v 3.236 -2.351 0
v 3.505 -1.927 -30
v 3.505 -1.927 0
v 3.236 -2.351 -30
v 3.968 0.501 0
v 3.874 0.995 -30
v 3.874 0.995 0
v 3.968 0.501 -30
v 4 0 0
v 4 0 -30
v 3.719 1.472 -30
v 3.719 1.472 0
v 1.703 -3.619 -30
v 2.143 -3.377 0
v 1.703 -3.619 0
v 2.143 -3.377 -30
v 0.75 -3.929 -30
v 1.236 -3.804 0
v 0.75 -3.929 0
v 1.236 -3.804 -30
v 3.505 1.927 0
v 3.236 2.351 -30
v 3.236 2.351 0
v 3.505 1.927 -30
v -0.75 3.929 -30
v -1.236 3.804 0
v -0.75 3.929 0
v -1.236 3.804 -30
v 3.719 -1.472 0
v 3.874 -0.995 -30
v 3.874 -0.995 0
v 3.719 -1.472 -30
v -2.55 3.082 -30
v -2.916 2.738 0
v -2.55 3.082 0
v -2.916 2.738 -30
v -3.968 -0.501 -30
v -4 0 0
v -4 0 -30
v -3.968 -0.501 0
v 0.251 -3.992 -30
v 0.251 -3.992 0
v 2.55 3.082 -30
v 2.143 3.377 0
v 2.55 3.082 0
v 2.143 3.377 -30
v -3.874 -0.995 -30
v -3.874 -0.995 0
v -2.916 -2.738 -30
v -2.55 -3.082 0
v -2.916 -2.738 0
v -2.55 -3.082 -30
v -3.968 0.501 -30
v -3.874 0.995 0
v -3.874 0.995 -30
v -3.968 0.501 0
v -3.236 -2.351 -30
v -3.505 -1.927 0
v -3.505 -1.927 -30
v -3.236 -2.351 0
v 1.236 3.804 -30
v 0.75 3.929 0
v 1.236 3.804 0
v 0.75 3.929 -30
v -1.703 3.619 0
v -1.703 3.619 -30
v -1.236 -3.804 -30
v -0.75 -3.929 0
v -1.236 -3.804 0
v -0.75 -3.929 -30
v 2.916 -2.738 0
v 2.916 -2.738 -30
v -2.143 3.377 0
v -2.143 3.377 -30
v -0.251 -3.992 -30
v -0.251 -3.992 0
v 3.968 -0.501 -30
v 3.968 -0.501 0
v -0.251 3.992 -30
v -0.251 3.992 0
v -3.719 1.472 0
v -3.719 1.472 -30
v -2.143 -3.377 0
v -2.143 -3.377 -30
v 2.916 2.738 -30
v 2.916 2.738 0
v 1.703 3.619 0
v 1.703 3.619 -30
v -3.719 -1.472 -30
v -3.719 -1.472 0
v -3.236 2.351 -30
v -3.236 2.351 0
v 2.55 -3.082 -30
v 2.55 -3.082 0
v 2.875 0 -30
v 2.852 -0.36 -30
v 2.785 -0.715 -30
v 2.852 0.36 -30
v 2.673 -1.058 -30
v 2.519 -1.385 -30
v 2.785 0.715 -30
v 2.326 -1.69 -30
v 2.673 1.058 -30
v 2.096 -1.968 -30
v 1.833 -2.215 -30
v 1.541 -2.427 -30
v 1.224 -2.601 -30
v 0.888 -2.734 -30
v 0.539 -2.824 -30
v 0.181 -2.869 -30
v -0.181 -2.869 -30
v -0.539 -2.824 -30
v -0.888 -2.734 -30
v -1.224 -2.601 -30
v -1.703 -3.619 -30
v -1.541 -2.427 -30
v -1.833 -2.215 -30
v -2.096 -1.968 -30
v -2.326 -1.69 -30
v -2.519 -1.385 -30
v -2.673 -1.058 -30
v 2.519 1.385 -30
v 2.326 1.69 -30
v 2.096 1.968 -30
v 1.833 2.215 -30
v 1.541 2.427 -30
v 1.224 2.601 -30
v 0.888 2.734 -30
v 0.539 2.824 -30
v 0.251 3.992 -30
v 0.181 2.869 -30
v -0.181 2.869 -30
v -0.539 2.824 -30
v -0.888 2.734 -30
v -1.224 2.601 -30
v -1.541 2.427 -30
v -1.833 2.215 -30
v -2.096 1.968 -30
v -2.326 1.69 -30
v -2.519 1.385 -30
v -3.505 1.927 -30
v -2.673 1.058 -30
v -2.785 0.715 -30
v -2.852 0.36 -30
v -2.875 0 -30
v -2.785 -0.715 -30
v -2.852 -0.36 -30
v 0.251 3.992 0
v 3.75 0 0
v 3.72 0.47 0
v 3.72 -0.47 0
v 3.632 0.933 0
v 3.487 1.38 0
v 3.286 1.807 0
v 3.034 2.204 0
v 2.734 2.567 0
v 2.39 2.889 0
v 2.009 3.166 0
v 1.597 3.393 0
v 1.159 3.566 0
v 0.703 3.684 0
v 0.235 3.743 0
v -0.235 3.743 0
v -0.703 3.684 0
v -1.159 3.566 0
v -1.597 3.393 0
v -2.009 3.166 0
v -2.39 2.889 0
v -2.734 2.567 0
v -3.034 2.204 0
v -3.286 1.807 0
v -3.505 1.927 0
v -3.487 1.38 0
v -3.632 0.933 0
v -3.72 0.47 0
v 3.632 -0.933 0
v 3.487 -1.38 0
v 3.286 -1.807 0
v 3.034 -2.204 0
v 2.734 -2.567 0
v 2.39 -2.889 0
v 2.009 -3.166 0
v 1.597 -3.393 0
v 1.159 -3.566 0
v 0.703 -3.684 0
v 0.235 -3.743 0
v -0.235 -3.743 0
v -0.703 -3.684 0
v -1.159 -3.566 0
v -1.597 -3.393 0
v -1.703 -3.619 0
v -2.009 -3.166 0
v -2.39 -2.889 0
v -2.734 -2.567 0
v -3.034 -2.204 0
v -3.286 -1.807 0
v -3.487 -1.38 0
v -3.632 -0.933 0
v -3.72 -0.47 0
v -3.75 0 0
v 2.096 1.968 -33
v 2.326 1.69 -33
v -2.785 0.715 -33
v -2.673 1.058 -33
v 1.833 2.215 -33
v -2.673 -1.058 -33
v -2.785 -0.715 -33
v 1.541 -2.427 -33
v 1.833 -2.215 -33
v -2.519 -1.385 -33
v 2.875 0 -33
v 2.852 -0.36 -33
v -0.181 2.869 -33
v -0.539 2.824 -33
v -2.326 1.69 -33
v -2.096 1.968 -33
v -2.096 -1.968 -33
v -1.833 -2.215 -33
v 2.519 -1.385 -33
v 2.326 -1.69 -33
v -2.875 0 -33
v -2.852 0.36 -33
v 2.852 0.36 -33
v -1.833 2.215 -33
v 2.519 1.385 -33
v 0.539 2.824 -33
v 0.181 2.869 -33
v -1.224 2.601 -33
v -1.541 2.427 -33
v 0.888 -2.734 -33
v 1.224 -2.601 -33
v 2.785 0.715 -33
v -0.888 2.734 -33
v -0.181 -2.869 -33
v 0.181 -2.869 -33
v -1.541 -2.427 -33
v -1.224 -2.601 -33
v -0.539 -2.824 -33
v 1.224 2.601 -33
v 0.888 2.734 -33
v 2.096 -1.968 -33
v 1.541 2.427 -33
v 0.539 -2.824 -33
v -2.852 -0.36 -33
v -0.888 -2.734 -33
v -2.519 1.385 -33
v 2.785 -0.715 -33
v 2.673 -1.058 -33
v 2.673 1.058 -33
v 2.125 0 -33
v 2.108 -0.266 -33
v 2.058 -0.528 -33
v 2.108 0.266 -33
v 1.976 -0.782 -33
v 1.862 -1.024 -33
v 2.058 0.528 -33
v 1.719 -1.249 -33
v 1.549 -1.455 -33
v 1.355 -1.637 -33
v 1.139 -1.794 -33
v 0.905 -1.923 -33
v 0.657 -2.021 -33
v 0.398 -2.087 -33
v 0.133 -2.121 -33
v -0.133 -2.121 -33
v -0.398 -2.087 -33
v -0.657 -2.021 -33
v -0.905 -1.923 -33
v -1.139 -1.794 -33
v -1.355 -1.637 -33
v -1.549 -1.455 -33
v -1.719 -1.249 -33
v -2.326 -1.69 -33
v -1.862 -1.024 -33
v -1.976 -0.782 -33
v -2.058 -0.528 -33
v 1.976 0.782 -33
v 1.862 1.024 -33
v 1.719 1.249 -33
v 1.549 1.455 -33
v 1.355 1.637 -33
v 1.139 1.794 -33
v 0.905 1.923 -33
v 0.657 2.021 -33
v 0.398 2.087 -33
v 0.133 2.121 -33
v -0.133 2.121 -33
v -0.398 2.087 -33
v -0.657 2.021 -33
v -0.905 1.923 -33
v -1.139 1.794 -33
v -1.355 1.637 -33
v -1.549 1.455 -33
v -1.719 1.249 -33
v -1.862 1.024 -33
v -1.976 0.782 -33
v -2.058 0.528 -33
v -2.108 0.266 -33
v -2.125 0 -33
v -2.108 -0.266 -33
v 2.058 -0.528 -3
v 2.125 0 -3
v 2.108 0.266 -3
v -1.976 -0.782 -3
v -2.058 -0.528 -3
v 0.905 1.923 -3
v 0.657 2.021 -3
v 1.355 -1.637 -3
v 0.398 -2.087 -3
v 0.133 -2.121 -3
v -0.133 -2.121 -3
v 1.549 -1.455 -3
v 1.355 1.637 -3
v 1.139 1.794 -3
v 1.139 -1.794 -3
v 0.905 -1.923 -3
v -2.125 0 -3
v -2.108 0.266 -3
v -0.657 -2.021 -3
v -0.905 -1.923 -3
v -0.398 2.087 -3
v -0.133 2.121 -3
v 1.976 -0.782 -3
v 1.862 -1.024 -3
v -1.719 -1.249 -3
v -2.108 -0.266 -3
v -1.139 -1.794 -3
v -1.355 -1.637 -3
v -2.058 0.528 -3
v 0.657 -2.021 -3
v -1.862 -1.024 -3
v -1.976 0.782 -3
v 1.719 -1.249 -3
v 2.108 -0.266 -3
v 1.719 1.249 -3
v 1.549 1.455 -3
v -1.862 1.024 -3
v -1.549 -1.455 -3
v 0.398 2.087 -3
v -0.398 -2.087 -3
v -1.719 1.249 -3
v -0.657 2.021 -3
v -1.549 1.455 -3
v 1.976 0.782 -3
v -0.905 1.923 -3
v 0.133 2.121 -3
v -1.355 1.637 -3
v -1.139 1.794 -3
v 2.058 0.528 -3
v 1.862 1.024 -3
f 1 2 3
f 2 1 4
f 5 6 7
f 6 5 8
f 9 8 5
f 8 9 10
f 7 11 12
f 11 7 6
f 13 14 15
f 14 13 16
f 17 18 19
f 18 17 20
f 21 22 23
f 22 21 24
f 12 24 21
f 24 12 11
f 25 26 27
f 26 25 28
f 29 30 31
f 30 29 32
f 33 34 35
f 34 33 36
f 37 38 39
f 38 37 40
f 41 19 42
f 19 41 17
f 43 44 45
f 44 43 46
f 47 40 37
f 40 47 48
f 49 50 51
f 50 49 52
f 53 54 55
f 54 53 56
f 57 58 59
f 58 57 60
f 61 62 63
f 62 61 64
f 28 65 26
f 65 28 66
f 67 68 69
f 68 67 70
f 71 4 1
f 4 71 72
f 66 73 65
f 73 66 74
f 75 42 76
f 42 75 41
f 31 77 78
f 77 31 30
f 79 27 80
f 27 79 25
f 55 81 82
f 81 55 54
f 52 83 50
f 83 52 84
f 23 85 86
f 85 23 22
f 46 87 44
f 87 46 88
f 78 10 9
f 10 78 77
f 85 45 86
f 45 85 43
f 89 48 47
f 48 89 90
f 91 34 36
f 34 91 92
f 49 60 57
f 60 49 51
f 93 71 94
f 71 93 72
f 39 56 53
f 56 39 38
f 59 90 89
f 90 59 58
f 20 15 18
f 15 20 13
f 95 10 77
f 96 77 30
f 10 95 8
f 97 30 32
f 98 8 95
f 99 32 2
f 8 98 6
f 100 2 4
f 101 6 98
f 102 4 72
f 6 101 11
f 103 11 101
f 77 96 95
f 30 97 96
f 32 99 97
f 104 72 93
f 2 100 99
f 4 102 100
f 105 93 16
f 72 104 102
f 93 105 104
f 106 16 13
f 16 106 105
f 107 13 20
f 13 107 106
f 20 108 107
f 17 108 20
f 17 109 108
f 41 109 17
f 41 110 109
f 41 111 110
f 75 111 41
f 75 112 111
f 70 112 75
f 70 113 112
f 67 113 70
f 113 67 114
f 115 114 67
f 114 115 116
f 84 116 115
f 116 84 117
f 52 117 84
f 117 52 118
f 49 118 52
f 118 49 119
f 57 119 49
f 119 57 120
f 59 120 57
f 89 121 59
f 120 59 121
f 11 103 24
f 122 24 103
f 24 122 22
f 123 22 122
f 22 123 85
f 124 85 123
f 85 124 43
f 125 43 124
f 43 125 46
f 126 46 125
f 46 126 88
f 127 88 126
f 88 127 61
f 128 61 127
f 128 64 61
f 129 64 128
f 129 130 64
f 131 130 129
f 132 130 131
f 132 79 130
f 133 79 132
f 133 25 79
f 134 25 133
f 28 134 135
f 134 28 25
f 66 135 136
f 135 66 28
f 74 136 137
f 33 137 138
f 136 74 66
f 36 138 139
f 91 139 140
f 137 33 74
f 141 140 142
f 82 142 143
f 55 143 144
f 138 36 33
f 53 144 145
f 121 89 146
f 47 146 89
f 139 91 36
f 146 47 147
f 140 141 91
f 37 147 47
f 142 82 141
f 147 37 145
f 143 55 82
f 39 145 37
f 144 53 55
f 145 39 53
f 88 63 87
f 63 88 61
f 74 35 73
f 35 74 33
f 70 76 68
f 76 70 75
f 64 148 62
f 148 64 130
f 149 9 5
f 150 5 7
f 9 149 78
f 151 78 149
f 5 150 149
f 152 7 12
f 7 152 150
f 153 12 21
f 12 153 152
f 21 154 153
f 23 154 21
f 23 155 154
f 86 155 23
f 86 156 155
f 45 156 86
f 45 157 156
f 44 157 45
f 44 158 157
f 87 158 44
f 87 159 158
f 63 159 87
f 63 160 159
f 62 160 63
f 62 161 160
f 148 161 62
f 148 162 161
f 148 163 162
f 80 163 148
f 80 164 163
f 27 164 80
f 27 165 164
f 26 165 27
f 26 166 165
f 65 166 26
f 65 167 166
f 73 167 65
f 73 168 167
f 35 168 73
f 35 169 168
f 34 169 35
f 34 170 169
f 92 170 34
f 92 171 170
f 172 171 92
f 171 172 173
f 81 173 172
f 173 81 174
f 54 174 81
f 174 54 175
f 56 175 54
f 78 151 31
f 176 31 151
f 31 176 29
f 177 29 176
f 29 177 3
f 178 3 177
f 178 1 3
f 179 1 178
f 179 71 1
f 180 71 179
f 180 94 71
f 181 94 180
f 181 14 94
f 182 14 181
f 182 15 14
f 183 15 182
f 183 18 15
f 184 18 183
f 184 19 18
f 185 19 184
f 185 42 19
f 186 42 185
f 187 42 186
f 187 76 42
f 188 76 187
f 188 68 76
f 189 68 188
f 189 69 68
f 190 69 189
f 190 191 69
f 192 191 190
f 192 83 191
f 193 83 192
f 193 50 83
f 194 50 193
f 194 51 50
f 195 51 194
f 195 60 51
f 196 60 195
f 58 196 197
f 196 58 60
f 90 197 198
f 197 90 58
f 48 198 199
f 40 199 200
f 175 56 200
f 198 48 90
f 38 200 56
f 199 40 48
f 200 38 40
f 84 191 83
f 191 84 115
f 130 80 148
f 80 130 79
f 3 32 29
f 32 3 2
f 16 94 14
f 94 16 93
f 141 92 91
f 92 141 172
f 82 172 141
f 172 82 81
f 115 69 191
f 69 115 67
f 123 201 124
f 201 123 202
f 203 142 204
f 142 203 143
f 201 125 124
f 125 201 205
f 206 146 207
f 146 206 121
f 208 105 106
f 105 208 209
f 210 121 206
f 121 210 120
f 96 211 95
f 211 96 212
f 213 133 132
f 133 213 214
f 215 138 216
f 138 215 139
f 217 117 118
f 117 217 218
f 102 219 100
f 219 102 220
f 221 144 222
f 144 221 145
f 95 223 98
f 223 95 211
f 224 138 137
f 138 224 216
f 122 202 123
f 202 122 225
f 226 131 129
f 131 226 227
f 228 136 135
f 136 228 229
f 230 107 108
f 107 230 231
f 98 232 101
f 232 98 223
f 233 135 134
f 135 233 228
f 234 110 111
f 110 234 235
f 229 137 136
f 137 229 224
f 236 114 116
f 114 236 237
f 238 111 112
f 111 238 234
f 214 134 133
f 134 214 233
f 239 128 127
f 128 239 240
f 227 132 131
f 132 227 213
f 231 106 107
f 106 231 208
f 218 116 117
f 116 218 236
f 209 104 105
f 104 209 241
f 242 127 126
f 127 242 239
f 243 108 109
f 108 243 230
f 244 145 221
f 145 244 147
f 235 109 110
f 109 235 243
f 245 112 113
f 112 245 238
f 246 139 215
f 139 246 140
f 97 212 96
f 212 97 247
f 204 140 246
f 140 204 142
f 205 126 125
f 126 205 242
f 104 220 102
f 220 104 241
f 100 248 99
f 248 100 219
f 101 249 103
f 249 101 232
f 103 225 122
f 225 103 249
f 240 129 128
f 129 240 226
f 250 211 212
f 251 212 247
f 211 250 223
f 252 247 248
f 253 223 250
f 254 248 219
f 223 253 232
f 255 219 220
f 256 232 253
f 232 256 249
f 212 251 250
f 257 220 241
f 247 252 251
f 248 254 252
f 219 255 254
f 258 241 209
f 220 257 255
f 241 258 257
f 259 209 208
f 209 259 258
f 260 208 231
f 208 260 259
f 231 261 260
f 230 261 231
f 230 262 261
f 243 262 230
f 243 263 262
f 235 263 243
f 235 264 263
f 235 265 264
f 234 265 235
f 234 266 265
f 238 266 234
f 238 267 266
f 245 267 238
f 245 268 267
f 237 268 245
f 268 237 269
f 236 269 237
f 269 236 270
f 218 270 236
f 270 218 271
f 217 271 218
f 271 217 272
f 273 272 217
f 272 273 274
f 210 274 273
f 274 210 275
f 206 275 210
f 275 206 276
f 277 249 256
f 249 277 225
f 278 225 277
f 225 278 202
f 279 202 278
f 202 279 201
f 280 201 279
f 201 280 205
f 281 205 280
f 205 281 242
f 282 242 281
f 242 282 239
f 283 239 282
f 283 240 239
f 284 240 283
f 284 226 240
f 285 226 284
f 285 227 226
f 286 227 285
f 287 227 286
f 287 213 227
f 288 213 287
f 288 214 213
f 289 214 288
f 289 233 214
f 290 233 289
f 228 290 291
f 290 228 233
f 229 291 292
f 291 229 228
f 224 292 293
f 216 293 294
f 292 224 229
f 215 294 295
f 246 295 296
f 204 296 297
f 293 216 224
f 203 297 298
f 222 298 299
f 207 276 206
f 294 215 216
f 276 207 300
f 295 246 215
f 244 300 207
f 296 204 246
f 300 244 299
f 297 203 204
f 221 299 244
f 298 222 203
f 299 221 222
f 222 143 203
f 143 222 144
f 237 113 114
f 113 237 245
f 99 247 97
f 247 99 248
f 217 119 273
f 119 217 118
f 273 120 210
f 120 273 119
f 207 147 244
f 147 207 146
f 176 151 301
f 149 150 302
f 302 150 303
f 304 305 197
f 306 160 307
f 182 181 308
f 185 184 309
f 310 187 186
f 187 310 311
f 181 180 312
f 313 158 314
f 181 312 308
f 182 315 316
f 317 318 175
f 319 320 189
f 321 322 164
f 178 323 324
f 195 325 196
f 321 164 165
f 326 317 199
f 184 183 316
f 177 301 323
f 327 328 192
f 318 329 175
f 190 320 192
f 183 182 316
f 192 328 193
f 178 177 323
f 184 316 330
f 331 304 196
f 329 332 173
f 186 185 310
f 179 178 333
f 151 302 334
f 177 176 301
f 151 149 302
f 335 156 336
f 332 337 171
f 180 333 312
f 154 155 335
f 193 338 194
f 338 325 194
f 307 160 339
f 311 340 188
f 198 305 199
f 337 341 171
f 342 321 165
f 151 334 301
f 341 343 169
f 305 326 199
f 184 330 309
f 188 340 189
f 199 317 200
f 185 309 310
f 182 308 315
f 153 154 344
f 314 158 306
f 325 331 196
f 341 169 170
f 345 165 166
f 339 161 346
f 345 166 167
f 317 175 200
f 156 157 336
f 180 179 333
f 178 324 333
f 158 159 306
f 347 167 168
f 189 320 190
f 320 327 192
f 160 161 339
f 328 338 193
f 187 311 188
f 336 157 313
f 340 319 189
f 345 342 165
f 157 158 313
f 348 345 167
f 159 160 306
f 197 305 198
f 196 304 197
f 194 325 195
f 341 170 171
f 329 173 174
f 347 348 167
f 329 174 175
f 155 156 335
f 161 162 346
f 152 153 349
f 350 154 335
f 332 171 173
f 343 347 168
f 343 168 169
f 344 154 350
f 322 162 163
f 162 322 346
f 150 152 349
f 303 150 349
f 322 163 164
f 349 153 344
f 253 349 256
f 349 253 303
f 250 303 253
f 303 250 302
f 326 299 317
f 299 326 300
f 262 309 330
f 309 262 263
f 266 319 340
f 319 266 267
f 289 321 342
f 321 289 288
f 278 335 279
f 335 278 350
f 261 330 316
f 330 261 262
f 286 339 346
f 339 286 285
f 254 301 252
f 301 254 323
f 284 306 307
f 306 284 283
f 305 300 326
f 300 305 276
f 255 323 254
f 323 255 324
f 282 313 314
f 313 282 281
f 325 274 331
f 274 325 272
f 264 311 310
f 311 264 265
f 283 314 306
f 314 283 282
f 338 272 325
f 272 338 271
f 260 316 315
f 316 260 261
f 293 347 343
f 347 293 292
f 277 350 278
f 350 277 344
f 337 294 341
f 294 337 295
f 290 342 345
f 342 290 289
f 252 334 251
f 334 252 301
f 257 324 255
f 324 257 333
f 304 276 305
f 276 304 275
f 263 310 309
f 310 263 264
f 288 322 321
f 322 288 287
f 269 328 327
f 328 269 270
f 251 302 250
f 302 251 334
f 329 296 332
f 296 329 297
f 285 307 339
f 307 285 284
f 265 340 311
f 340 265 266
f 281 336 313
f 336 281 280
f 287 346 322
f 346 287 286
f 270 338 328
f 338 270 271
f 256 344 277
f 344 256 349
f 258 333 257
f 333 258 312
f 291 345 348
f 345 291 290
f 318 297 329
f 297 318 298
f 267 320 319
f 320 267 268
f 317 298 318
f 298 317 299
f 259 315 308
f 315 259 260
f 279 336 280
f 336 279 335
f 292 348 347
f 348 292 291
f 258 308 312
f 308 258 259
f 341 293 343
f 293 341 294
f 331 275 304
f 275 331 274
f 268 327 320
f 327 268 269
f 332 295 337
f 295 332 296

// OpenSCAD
$fn = 50;

difference() {
	union() {
		translate(v = [0, 0, -30.0]) {
			cylinder(h = 30, r = 4.0);
		}
		#translate(v = [0, 0, -33.0]) {
			cylinder(h = 33, r = 2.875);
		}
	}
	union() {
		translate(v = [0, 0, 0]) {
			rotate(a = [0, 0, 0]) {
				difference() {
					union() {
						translate(v = [0, 0, -33.0]) {
							cylinder(h = 33, r = 2.0);
						}
						translate(v = [0, 0, -3]) {
							cylinder(h = 3, r1 = 2.125, r2 = 3.75);
						}
						translate(v = [0, 0, -33.0]) {
							cylinder(h = 33, r = 2.125);
						}
						translate(v = [0, 0, -33.0]) {
							cylinder(h = 33, r = 2.0);
						}
					}
					union();
				}
			}
		}
	}
}
